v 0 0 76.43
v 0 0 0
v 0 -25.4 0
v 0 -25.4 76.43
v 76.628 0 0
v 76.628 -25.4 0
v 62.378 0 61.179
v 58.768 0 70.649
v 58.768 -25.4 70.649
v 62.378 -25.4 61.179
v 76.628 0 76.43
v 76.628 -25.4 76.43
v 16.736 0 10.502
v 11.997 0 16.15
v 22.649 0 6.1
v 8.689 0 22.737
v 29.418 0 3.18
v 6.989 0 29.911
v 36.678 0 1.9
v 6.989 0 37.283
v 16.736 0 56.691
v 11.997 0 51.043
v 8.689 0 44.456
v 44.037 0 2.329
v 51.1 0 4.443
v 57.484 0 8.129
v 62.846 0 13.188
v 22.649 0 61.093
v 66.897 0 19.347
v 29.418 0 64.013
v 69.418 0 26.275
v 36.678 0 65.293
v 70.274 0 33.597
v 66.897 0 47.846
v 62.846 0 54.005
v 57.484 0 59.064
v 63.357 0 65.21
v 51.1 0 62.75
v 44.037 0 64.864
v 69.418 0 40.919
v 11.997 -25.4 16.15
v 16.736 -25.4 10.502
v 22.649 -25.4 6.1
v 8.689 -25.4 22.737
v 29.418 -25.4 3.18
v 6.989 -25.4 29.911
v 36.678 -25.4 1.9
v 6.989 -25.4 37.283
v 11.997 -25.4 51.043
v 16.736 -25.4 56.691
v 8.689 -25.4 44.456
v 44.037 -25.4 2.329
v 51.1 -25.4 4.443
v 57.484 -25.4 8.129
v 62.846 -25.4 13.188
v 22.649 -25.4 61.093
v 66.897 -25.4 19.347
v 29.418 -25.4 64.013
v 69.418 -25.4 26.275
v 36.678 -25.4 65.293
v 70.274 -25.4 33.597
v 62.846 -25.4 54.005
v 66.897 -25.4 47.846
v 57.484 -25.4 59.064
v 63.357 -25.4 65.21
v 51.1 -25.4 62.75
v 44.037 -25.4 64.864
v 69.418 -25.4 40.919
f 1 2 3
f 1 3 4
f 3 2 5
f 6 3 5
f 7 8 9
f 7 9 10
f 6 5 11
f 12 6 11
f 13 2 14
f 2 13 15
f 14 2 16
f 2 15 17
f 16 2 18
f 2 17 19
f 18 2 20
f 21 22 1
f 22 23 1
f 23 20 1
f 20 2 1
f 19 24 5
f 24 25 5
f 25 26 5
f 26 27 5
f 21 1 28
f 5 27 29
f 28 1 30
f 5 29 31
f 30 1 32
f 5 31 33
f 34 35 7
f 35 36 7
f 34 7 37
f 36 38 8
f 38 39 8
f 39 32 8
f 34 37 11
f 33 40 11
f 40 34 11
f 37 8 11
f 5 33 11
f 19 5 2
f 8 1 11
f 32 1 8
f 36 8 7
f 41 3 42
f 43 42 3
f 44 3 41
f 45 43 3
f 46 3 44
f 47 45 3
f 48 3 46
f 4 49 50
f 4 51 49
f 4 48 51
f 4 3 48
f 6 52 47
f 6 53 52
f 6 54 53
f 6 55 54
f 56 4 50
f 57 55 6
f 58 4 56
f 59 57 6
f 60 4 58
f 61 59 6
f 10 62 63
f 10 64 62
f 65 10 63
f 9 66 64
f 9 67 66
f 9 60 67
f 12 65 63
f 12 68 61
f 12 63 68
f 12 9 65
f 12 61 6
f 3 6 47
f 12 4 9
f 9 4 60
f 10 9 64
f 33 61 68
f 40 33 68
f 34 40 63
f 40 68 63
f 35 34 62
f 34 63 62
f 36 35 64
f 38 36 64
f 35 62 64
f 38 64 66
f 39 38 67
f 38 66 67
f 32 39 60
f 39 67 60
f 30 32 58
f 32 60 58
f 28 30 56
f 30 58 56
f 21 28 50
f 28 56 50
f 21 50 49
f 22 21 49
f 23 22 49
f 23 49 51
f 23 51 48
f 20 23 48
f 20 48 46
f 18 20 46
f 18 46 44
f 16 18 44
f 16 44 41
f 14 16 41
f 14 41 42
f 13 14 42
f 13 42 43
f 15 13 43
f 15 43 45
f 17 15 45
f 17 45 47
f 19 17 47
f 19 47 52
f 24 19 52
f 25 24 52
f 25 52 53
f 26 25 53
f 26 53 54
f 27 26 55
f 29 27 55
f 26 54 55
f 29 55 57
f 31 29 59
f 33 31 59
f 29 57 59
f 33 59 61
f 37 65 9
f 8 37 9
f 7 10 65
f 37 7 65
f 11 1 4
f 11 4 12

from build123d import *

# Parameters (mm, degrees)
F0_W     = 76.628029
F0_H     = 76.429892
F1_DEPTH = 25.4
F2_R     = 31.75
F3_DEPTH = 25.401
F5_DEPTH = 25.4


with BuildPart() as f1:
    # F0 (on Front) → F1 (new body)
    with BuildSketch(Plane.XZ):
        with Locations((38.314014, 38.214946)):
            Rectangle(F0_W, F0_H)
    extrude(amount=F1_DEPTH)

    # F2 (on face) → F3 (cut, through all)
    with BuildSketch(Plane.XZ.offset(25.4)):
        with Locations((38.524082, 33.596565)):
            Circle(F2_R)
    extrude(amount=-F3_DEPTH, mode=Mode.SUBTRACT)

    # F4 (on face) → F5 (cut)
    with BuildSketch(Plane.XZ.offset(25.4)):
        Polygon((63.356534, 65.209933), (58.767688, 70.649475), (62.377501, 61.178781), align=None)
    extrude(amount=-F5_DEPTH, mode=Mode.SUBTRACT)


solid = f1.part
